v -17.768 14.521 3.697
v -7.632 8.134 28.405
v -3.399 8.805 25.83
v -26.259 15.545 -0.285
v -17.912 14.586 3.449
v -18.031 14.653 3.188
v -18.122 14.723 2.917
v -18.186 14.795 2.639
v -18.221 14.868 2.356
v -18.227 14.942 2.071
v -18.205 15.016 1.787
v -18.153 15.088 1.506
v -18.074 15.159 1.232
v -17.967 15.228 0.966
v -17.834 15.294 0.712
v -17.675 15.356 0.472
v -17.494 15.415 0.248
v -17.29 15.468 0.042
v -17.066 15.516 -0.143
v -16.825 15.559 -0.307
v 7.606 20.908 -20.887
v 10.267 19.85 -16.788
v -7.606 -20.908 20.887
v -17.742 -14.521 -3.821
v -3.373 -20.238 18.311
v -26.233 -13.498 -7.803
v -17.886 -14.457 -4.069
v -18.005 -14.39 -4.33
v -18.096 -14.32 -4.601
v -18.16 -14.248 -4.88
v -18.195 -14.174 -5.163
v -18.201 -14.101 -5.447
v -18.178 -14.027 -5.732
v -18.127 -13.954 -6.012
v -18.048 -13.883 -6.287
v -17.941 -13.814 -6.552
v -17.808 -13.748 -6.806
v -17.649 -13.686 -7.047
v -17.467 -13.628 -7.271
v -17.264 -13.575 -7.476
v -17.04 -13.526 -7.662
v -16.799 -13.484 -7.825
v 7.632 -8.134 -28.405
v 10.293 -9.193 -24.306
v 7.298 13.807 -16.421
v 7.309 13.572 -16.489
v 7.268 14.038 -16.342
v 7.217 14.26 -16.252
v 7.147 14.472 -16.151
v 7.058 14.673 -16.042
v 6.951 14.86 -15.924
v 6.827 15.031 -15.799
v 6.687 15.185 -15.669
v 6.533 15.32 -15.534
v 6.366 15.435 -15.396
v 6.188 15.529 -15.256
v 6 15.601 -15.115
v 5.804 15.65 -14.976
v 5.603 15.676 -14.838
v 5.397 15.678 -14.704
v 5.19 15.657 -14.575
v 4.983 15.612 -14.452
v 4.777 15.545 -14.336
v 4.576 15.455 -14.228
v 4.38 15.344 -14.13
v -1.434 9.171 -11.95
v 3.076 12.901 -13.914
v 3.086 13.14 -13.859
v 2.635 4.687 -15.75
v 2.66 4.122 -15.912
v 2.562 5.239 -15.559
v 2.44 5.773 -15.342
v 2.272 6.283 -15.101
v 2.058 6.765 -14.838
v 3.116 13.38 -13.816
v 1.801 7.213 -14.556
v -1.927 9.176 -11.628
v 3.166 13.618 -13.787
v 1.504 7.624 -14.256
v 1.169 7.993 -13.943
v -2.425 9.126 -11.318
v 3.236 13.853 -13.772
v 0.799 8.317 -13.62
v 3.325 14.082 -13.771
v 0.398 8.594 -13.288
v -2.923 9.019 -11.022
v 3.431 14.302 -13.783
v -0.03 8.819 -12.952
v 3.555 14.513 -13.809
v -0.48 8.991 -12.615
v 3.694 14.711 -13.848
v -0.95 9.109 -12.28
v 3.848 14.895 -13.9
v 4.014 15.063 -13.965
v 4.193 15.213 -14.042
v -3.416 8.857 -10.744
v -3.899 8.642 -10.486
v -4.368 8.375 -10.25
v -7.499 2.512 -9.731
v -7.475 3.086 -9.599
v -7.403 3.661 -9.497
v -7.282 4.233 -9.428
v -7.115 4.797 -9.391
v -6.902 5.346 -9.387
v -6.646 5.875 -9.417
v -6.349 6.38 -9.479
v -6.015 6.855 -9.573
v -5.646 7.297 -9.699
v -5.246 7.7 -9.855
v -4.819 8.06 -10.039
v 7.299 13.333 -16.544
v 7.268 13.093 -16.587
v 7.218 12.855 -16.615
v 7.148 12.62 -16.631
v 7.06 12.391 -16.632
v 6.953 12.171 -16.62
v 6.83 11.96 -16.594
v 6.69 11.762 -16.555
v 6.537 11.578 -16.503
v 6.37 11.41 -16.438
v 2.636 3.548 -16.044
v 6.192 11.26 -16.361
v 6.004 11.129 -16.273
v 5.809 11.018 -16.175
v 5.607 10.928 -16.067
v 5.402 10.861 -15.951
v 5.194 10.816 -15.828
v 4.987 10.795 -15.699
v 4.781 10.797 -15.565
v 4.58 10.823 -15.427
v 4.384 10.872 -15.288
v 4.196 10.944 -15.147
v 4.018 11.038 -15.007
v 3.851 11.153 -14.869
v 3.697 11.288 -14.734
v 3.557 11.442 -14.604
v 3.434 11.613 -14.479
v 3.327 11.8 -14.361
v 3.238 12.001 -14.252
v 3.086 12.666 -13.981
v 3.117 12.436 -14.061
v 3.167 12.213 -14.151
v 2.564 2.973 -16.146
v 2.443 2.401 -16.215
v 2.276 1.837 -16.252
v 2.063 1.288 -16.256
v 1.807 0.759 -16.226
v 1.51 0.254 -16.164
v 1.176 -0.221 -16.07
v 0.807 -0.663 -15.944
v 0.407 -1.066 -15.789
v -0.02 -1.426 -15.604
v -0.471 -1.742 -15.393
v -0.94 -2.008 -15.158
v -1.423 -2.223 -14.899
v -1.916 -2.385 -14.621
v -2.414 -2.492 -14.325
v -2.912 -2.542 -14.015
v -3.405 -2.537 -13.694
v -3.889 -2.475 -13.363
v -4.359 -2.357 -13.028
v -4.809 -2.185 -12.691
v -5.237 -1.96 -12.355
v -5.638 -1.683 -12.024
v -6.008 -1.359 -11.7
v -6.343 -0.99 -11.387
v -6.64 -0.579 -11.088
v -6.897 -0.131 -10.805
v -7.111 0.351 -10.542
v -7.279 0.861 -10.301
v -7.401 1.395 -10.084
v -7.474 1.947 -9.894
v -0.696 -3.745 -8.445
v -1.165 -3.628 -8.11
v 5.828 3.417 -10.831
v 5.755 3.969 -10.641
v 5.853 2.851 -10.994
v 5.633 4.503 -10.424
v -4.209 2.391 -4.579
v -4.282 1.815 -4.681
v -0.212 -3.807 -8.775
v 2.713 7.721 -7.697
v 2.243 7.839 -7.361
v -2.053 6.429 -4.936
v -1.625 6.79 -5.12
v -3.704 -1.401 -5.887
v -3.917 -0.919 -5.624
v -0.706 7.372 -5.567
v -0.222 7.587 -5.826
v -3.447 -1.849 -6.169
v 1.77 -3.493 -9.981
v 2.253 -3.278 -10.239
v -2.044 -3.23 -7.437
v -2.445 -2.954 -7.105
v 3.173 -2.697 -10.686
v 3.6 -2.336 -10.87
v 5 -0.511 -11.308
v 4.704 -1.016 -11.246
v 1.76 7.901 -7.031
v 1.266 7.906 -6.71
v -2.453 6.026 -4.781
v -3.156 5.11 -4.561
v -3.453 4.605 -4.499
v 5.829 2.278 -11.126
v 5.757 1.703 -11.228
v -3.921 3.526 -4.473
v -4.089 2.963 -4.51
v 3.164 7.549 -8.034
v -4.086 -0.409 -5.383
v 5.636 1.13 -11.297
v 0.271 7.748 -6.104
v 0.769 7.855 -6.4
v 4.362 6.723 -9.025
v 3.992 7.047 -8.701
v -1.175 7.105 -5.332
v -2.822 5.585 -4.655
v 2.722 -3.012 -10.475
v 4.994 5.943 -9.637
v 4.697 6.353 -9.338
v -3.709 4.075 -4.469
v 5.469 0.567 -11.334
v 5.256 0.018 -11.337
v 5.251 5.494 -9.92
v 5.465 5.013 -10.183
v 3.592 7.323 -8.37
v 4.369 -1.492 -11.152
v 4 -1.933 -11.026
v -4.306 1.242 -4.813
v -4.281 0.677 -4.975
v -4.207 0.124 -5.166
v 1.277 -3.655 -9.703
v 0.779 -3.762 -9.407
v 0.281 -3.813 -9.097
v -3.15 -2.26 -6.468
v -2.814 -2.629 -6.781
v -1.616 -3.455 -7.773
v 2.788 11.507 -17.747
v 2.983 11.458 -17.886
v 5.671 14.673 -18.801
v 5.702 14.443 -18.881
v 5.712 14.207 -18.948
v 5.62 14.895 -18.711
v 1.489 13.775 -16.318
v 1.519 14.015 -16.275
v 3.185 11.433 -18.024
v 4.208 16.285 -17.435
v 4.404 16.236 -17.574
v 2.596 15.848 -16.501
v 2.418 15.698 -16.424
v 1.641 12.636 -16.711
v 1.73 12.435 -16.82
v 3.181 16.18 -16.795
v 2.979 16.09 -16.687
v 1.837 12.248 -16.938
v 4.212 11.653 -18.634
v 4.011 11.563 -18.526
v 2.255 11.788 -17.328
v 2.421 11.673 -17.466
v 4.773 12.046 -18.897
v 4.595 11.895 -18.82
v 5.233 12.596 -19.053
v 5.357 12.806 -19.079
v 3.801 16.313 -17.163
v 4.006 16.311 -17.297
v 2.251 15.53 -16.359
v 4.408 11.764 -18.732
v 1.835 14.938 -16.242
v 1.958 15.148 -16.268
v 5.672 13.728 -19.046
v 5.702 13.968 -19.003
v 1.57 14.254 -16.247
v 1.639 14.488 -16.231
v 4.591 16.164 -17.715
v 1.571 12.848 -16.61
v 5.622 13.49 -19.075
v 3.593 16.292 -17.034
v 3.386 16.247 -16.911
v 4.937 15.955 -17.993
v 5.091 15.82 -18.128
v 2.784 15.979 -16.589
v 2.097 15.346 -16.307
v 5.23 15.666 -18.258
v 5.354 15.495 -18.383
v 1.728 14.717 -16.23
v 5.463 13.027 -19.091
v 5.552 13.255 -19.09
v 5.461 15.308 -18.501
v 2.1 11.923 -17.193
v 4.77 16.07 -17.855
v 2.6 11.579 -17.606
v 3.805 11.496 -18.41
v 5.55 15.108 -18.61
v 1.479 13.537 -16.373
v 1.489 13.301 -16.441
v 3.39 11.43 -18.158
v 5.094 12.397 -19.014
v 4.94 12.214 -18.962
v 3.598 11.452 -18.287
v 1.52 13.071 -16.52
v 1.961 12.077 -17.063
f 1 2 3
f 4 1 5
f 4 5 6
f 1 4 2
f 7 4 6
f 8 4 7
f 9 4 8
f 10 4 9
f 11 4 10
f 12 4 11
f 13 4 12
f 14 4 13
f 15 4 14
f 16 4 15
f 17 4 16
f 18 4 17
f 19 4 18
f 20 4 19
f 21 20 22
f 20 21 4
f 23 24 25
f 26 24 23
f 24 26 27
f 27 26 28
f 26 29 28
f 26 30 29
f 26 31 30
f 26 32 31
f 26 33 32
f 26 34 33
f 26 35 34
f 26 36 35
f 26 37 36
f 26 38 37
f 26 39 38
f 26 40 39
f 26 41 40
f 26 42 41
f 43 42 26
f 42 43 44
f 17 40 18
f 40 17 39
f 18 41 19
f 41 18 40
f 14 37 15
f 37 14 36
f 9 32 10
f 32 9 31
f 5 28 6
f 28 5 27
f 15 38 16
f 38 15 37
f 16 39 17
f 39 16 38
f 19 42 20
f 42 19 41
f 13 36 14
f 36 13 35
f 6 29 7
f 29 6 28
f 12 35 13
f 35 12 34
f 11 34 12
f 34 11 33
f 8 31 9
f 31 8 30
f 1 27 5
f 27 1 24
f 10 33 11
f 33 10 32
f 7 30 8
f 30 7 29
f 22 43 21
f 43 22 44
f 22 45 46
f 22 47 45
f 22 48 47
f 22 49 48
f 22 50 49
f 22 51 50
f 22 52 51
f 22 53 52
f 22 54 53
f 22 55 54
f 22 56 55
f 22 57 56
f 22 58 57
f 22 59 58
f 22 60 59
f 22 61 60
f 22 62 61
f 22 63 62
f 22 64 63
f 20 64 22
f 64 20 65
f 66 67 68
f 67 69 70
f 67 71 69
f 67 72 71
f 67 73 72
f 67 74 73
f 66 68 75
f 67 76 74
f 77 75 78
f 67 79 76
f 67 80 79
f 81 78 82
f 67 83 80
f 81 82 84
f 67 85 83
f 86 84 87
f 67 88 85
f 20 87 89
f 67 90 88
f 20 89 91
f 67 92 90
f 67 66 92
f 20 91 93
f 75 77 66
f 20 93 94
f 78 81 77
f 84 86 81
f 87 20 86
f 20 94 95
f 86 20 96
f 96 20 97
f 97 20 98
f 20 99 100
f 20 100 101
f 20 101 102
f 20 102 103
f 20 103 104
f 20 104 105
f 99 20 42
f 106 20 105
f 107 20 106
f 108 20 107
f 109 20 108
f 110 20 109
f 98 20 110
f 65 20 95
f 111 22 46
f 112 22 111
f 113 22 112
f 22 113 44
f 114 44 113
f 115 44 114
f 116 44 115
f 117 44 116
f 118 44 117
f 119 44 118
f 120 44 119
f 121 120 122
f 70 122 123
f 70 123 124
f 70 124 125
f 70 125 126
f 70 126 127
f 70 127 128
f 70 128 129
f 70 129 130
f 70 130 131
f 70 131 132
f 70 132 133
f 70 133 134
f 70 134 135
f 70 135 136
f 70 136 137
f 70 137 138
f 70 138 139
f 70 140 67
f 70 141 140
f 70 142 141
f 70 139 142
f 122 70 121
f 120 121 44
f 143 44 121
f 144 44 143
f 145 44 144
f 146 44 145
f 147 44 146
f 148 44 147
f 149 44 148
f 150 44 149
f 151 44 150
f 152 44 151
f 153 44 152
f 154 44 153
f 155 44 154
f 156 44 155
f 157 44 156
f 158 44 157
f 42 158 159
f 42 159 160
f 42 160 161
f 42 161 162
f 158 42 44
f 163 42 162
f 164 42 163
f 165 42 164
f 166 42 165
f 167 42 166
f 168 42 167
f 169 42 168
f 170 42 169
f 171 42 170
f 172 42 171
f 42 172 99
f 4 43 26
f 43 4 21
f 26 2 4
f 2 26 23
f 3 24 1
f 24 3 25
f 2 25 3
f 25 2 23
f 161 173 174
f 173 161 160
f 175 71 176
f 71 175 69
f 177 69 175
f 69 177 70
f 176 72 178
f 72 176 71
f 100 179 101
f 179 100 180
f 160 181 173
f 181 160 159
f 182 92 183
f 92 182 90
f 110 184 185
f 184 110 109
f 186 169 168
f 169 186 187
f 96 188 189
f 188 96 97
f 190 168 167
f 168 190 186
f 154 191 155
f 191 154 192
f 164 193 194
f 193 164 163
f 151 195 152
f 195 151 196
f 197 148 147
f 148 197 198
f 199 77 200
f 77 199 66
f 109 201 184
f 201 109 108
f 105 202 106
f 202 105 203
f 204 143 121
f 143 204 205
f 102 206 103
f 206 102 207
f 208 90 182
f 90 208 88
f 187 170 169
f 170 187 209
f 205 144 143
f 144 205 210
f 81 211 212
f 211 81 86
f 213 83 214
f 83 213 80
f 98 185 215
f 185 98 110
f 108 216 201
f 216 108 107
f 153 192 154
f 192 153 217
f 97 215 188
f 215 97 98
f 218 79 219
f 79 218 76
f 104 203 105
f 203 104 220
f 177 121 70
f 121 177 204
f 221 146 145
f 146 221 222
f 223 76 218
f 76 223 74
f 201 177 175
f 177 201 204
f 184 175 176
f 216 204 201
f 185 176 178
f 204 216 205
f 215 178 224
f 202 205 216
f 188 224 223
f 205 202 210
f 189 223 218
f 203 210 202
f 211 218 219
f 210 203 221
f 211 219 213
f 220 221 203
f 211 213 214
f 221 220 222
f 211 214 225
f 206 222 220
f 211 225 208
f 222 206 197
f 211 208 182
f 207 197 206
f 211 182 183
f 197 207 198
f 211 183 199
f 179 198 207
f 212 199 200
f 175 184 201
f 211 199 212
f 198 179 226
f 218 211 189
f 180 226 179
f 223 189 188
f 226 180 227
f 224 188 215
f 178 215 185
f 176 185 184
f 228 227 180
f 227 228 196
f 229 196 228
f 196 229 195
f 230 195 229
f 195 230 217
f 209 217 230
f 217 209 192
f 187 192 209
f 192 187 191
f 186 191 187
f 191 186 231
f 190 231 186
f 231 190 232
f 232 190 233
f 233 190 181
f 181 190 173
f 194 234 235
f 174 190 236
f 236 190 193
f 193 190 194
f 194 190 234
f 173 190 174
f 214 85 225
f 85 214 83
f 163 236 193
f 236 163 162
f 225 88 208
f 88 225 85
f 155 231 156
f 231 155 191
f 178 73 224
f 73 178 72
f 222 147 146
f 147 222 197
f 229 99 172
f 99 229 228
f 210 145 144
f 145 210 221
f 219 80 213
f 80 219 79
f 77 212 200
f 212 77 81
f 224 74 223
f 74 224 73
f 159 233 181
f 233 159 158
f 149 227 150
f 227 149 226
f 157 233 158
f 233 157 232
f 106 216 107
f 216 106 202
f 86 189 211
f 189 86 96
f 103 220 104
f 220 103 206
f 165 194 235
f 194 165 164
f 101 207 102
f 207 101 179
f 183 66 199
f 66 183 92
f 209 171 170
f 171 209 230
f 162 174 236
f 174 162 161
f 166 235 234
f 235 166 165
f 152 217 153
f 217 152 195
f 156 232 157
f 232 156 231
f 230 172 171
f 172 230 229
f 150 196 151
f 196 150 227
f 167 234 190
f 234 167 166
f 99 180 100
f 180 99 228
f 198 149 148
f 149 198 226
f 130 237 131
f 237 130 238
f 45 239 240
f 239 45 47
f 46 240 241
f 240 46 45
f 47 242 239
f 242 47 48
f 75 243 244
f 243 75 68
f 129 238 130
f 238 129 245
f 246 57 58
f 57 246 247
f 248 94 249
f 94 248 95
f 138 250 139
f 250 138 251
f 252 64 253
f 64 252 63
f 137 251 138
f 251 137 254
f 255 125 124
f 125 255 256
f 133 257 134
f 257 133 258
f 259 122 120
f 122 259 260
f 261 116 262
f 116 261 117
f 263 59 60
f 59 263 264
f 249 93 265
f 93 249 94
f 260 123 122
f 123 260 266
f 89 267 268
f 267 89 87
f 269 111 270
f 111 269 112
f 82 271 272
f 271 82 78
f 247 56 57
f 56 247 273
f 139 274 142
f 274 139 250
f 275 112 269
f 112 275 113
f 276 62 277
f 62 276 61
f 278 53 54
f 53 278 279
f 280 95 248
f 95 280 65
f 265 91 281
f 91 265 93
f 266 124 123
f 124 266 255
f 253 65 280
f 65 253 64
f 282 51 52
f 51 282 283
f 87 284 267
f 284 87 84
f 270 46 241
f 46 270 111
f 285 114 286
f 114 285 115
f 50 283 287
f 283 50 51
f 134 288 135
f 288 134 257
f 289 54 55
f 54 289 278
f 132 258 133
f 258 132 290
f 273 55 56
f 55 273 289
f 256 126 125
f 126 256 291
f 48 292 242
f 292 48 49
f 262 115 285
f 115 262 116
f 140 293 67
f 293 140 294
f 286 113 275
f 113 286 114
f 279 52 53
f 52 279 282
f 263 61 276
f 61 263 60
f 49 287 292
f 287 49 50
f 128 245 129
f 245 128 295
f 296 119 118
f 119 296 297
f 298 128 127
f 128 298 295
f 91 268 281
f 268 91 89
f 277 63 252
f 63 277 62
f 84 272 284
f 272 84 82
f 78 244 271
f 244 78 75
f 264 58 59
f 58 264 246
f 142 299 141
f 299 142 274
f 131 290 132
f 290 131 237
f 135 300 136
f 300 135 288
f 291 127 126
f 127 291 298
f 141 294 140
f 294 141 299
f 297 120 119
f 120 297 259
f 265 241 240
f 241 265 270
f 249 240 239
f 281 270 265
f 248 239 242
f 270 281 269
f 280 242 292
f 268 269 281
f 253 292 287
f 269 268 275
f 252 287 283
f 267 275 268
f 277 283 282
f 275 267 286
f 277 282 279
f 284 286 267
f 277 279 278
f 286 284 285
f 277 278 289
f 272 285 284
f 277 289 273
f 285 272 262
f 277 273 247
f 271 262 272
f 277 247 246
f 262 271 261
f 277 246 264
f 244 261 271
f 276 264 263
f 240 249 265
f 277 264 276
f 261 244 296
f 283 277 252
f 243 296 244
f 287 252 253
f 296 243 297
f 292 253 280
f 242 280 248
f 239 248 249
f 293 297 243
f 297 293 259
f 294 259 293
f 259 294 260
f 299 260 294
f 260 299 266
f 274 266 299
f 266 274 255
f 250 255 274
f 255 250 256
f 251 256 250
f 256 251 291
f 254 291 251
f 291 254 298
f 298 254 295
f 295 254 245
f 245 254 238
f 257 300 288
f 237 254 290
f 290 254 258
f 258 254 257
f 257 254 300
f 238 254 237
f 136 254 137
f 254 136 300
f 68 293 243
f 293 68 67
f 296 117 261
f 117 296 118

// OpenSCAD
// file: composite_bracket.scad
// Composite bracket: ground truth for the segmentation pipeline.
// See docs/planning/segmentation_composite_bracket.md and composite_bracket_expected.json.
// Hand-written (not generated from the feature-fixture manifest).
$fn = 64;

module composite_bracket() {
    difference() {
        union() {
            cube([40, 30, 5]);                          // base
            cube([5, 30, 35]);                          // wall
            difference() {                              // R3 fillet, inner corner, axis Y
                translate([4, 0, 4]) cube([4, 30, 4]);
                translate([8, -1, 8]) rotate([-90, 0, 0]) cylinder(r = 3, h = 32);
            }
            translate([25, 15, 4]) cylinder(r = 6, h = 7);   // boss, top at z = 11
        }
        translate([34, 24, 2]) cylinder(r = 2.5, h = 4);     // blind hole, floor at z = 2
    }
}

composite_bracket();
// main file
// Coarse rotated bracket; polygon vertices retain the true cylinder radii.
use <composite_bracket.scad>
$fn = 16;
rotate([17, 31, 9]) translate([-20, -15, -17.5]) composite_bracket();
